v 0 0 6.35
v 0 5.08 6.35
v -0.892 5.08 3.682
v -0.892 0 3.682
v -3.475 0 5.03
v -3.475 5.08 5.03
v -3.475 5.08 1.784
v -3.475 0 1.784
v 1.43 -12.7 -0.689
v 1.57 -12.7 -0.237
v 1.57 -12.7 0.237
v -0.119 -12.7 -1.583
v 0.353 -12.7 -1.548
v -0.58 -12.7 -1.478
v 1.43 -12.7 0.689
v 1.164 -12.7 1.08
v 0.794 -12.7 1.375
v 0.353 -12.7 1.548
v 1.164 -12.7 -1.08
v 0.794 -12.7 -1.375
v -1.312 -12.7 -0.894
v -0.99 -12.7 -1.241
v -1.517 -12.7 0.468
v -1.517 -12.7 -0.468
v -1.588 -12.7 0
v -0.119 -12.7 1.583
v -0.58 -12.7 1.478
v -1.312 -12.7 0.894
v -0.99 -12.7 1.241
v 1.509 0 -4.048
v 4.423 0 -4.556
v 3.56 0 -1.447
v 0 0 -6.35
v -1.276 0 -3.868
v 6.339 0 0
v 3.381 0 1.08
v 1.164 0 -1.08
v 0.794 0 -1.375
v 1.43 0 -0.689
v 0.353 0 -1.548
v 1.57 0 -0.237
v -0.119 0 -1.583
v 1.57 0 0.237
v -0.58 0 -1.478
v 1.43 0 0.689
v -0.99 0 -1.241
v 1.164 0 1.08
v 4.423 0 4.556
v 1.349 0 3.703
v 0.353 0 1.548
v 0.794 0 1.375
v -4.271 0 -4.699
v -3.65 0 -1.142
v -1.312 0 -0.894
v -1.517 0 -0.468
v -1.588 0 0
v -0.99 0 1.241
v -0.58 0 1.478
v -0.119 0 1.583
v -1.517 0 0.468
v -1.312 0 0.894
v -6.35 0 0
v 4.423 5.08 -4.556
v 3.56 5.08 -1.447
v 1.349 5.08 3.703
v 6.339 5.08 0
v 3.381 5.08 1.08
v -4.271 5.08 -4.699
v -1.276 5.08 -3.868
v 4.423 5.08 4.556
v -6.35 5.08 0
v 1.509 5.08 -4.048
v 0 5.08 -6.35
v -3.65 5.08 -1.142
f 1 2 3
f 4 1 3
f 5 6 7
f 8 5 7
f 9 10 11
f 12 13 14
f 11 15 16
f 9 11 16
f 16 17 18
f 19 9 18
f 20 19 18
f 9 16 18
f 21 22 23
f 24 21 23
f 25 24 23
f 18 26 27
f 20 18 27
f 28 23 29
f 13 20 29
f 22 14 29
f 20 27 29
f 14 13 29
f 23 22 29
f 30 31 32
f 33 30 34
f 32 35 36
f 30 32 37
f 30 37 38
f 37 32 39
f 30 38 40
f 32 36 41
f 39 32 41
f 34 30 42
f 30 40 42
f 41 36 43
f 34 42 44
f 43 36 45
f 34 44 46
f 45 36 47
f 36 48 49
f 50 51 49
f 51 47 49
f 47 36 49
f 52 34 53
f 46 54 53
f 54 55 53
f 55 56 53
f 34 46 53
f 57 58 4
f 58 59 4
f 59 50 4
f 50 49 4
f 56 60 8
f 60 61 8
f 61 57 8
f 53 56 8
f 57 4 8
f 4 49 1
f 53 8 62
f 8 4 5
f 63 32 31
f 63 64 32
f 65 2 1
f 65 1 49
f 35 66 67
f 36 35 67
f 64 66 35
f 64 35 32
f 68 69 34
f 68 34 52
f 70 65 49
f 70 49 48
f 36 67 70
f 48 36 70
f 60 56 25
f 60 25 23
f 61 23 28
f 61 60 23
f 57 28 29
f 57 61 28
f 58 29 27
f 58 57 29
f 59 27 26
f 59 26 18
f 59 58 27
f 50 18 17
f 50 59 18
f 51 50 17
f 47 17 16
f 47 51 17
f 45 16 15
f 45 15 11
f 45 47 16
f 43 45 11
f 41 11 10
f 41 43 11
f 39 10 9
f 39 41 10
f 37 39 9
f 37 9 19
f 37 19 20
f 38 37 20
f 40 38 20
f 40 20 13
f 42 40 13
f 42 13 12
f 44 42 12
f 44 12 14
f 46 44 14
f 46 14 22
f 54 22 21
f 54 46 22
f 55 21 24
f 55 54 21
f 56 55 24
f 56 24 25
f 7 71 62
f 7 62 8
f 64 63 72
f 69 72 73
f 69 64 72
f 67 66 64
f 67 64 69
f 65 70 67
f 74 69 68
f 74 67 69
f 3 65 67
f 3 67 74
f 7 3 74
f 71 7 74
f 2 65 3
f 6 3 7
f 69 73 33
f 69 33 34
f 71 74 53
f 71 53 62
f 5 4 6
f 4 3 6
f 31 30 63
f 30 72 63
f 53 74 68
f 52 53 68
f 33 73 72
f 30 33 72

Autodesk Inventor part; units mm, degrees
ref_plane "YZ Plane" through (0, 0, 0) normal (1, 0, 0) x (0, 1, 0)
ref_plane "XZ Plane" through (0, 0, 0) normal (0, 1, 0) x (-1, 0, 0)
ref_plane "XY Plane" through (0, 0, 0) normal (0, 0, 1) x (1, 0, 0)
sketch "Sketch1" plane through (0, 0, 0) normal (0, 1, 0) x (-1, 0, 0)
  circle A0 centre (0, 0) radius 1.5875
  circle A1 centre (0, 0) radius 6.35
  dimension "d0" = 3.175
  dimension "d1" = 12.7
extrude "Extrusion1" add sketch "Sketch1" along normal blind 5.08 contours A0 | A1
extrude "Extrusion2" add sketch "Sketch1" against normal blind 12.7 contours A0
sketch "Sketch2" plane through (0, 5.08, 0) normal (0, 1, 0) x (1, 0, 0)
  line L0 (6.3393, 0) -> (3.5604, 1.4472)
  line L1 (3.5604, 1.4472) -> (6.3393, 0)
  line L2 (6.3393, 0) -> (3.381, -1.08)
  line L3 (0, 0) -> (-1.7844, 0)
  circle A0 centre (0, 0) radius 6.35 projected
  line L4 (0, -6.35) -> (1.3494, -3.7028)
  line L5 (0, -6.35) -> (-0.8922, -3.6818)
  line L6 (-6.35, 0) -> (-3.4749, -1.7844)
  line L7 (-3.4749, -1.7844) -> (-6.35, 0)
  line L8 (-3.6501, 1.1418) -> (-6.35, 0)
  line L9 (0, 6.35) -> (1.509, 4.0476)
  line L10 (1.509, 4.0476) -> (0, 6.35)
  line L11 (0, 6.35) -> (-1.2759, 3.8681)
  line L12 (1.509, 4.0476) -> (4.4233, 4.556)
  line L13 (3.5604, 1.4472) -> (4.4233, 4.556)
  line L14 (3.381, -1.08) -> (4.4233, -4.556)
  line L15 (1.3494, -3.7028) -> (4.4233, -4.556)
  line L16 (-0.8922, -3.6818) -> (-3.4749, -5.0301)
  line L17 (-3.4749, -5.0301) -> (-3.4749, -1.7844)
  line L18 (-3.6501, 1.1418) -> (-4.2707, 4.6993)
  line L19 (-1.2759, 3.8681) -> (-4.2707, 4.6993)
  circle A1 centre (0, 0) radius 6.35
extrude "Extrusion3" cut sketch "Sketch2" against normal blind 5.08 contours L0 L13 A0 L14 L2 | L12 L9 A0 | A0 L4 L15 | L11 L19 A0 | A0 L6 L17 L16 L5 | L18 L8 A0
properties part number "Wheels" material "PBT Plastic"
